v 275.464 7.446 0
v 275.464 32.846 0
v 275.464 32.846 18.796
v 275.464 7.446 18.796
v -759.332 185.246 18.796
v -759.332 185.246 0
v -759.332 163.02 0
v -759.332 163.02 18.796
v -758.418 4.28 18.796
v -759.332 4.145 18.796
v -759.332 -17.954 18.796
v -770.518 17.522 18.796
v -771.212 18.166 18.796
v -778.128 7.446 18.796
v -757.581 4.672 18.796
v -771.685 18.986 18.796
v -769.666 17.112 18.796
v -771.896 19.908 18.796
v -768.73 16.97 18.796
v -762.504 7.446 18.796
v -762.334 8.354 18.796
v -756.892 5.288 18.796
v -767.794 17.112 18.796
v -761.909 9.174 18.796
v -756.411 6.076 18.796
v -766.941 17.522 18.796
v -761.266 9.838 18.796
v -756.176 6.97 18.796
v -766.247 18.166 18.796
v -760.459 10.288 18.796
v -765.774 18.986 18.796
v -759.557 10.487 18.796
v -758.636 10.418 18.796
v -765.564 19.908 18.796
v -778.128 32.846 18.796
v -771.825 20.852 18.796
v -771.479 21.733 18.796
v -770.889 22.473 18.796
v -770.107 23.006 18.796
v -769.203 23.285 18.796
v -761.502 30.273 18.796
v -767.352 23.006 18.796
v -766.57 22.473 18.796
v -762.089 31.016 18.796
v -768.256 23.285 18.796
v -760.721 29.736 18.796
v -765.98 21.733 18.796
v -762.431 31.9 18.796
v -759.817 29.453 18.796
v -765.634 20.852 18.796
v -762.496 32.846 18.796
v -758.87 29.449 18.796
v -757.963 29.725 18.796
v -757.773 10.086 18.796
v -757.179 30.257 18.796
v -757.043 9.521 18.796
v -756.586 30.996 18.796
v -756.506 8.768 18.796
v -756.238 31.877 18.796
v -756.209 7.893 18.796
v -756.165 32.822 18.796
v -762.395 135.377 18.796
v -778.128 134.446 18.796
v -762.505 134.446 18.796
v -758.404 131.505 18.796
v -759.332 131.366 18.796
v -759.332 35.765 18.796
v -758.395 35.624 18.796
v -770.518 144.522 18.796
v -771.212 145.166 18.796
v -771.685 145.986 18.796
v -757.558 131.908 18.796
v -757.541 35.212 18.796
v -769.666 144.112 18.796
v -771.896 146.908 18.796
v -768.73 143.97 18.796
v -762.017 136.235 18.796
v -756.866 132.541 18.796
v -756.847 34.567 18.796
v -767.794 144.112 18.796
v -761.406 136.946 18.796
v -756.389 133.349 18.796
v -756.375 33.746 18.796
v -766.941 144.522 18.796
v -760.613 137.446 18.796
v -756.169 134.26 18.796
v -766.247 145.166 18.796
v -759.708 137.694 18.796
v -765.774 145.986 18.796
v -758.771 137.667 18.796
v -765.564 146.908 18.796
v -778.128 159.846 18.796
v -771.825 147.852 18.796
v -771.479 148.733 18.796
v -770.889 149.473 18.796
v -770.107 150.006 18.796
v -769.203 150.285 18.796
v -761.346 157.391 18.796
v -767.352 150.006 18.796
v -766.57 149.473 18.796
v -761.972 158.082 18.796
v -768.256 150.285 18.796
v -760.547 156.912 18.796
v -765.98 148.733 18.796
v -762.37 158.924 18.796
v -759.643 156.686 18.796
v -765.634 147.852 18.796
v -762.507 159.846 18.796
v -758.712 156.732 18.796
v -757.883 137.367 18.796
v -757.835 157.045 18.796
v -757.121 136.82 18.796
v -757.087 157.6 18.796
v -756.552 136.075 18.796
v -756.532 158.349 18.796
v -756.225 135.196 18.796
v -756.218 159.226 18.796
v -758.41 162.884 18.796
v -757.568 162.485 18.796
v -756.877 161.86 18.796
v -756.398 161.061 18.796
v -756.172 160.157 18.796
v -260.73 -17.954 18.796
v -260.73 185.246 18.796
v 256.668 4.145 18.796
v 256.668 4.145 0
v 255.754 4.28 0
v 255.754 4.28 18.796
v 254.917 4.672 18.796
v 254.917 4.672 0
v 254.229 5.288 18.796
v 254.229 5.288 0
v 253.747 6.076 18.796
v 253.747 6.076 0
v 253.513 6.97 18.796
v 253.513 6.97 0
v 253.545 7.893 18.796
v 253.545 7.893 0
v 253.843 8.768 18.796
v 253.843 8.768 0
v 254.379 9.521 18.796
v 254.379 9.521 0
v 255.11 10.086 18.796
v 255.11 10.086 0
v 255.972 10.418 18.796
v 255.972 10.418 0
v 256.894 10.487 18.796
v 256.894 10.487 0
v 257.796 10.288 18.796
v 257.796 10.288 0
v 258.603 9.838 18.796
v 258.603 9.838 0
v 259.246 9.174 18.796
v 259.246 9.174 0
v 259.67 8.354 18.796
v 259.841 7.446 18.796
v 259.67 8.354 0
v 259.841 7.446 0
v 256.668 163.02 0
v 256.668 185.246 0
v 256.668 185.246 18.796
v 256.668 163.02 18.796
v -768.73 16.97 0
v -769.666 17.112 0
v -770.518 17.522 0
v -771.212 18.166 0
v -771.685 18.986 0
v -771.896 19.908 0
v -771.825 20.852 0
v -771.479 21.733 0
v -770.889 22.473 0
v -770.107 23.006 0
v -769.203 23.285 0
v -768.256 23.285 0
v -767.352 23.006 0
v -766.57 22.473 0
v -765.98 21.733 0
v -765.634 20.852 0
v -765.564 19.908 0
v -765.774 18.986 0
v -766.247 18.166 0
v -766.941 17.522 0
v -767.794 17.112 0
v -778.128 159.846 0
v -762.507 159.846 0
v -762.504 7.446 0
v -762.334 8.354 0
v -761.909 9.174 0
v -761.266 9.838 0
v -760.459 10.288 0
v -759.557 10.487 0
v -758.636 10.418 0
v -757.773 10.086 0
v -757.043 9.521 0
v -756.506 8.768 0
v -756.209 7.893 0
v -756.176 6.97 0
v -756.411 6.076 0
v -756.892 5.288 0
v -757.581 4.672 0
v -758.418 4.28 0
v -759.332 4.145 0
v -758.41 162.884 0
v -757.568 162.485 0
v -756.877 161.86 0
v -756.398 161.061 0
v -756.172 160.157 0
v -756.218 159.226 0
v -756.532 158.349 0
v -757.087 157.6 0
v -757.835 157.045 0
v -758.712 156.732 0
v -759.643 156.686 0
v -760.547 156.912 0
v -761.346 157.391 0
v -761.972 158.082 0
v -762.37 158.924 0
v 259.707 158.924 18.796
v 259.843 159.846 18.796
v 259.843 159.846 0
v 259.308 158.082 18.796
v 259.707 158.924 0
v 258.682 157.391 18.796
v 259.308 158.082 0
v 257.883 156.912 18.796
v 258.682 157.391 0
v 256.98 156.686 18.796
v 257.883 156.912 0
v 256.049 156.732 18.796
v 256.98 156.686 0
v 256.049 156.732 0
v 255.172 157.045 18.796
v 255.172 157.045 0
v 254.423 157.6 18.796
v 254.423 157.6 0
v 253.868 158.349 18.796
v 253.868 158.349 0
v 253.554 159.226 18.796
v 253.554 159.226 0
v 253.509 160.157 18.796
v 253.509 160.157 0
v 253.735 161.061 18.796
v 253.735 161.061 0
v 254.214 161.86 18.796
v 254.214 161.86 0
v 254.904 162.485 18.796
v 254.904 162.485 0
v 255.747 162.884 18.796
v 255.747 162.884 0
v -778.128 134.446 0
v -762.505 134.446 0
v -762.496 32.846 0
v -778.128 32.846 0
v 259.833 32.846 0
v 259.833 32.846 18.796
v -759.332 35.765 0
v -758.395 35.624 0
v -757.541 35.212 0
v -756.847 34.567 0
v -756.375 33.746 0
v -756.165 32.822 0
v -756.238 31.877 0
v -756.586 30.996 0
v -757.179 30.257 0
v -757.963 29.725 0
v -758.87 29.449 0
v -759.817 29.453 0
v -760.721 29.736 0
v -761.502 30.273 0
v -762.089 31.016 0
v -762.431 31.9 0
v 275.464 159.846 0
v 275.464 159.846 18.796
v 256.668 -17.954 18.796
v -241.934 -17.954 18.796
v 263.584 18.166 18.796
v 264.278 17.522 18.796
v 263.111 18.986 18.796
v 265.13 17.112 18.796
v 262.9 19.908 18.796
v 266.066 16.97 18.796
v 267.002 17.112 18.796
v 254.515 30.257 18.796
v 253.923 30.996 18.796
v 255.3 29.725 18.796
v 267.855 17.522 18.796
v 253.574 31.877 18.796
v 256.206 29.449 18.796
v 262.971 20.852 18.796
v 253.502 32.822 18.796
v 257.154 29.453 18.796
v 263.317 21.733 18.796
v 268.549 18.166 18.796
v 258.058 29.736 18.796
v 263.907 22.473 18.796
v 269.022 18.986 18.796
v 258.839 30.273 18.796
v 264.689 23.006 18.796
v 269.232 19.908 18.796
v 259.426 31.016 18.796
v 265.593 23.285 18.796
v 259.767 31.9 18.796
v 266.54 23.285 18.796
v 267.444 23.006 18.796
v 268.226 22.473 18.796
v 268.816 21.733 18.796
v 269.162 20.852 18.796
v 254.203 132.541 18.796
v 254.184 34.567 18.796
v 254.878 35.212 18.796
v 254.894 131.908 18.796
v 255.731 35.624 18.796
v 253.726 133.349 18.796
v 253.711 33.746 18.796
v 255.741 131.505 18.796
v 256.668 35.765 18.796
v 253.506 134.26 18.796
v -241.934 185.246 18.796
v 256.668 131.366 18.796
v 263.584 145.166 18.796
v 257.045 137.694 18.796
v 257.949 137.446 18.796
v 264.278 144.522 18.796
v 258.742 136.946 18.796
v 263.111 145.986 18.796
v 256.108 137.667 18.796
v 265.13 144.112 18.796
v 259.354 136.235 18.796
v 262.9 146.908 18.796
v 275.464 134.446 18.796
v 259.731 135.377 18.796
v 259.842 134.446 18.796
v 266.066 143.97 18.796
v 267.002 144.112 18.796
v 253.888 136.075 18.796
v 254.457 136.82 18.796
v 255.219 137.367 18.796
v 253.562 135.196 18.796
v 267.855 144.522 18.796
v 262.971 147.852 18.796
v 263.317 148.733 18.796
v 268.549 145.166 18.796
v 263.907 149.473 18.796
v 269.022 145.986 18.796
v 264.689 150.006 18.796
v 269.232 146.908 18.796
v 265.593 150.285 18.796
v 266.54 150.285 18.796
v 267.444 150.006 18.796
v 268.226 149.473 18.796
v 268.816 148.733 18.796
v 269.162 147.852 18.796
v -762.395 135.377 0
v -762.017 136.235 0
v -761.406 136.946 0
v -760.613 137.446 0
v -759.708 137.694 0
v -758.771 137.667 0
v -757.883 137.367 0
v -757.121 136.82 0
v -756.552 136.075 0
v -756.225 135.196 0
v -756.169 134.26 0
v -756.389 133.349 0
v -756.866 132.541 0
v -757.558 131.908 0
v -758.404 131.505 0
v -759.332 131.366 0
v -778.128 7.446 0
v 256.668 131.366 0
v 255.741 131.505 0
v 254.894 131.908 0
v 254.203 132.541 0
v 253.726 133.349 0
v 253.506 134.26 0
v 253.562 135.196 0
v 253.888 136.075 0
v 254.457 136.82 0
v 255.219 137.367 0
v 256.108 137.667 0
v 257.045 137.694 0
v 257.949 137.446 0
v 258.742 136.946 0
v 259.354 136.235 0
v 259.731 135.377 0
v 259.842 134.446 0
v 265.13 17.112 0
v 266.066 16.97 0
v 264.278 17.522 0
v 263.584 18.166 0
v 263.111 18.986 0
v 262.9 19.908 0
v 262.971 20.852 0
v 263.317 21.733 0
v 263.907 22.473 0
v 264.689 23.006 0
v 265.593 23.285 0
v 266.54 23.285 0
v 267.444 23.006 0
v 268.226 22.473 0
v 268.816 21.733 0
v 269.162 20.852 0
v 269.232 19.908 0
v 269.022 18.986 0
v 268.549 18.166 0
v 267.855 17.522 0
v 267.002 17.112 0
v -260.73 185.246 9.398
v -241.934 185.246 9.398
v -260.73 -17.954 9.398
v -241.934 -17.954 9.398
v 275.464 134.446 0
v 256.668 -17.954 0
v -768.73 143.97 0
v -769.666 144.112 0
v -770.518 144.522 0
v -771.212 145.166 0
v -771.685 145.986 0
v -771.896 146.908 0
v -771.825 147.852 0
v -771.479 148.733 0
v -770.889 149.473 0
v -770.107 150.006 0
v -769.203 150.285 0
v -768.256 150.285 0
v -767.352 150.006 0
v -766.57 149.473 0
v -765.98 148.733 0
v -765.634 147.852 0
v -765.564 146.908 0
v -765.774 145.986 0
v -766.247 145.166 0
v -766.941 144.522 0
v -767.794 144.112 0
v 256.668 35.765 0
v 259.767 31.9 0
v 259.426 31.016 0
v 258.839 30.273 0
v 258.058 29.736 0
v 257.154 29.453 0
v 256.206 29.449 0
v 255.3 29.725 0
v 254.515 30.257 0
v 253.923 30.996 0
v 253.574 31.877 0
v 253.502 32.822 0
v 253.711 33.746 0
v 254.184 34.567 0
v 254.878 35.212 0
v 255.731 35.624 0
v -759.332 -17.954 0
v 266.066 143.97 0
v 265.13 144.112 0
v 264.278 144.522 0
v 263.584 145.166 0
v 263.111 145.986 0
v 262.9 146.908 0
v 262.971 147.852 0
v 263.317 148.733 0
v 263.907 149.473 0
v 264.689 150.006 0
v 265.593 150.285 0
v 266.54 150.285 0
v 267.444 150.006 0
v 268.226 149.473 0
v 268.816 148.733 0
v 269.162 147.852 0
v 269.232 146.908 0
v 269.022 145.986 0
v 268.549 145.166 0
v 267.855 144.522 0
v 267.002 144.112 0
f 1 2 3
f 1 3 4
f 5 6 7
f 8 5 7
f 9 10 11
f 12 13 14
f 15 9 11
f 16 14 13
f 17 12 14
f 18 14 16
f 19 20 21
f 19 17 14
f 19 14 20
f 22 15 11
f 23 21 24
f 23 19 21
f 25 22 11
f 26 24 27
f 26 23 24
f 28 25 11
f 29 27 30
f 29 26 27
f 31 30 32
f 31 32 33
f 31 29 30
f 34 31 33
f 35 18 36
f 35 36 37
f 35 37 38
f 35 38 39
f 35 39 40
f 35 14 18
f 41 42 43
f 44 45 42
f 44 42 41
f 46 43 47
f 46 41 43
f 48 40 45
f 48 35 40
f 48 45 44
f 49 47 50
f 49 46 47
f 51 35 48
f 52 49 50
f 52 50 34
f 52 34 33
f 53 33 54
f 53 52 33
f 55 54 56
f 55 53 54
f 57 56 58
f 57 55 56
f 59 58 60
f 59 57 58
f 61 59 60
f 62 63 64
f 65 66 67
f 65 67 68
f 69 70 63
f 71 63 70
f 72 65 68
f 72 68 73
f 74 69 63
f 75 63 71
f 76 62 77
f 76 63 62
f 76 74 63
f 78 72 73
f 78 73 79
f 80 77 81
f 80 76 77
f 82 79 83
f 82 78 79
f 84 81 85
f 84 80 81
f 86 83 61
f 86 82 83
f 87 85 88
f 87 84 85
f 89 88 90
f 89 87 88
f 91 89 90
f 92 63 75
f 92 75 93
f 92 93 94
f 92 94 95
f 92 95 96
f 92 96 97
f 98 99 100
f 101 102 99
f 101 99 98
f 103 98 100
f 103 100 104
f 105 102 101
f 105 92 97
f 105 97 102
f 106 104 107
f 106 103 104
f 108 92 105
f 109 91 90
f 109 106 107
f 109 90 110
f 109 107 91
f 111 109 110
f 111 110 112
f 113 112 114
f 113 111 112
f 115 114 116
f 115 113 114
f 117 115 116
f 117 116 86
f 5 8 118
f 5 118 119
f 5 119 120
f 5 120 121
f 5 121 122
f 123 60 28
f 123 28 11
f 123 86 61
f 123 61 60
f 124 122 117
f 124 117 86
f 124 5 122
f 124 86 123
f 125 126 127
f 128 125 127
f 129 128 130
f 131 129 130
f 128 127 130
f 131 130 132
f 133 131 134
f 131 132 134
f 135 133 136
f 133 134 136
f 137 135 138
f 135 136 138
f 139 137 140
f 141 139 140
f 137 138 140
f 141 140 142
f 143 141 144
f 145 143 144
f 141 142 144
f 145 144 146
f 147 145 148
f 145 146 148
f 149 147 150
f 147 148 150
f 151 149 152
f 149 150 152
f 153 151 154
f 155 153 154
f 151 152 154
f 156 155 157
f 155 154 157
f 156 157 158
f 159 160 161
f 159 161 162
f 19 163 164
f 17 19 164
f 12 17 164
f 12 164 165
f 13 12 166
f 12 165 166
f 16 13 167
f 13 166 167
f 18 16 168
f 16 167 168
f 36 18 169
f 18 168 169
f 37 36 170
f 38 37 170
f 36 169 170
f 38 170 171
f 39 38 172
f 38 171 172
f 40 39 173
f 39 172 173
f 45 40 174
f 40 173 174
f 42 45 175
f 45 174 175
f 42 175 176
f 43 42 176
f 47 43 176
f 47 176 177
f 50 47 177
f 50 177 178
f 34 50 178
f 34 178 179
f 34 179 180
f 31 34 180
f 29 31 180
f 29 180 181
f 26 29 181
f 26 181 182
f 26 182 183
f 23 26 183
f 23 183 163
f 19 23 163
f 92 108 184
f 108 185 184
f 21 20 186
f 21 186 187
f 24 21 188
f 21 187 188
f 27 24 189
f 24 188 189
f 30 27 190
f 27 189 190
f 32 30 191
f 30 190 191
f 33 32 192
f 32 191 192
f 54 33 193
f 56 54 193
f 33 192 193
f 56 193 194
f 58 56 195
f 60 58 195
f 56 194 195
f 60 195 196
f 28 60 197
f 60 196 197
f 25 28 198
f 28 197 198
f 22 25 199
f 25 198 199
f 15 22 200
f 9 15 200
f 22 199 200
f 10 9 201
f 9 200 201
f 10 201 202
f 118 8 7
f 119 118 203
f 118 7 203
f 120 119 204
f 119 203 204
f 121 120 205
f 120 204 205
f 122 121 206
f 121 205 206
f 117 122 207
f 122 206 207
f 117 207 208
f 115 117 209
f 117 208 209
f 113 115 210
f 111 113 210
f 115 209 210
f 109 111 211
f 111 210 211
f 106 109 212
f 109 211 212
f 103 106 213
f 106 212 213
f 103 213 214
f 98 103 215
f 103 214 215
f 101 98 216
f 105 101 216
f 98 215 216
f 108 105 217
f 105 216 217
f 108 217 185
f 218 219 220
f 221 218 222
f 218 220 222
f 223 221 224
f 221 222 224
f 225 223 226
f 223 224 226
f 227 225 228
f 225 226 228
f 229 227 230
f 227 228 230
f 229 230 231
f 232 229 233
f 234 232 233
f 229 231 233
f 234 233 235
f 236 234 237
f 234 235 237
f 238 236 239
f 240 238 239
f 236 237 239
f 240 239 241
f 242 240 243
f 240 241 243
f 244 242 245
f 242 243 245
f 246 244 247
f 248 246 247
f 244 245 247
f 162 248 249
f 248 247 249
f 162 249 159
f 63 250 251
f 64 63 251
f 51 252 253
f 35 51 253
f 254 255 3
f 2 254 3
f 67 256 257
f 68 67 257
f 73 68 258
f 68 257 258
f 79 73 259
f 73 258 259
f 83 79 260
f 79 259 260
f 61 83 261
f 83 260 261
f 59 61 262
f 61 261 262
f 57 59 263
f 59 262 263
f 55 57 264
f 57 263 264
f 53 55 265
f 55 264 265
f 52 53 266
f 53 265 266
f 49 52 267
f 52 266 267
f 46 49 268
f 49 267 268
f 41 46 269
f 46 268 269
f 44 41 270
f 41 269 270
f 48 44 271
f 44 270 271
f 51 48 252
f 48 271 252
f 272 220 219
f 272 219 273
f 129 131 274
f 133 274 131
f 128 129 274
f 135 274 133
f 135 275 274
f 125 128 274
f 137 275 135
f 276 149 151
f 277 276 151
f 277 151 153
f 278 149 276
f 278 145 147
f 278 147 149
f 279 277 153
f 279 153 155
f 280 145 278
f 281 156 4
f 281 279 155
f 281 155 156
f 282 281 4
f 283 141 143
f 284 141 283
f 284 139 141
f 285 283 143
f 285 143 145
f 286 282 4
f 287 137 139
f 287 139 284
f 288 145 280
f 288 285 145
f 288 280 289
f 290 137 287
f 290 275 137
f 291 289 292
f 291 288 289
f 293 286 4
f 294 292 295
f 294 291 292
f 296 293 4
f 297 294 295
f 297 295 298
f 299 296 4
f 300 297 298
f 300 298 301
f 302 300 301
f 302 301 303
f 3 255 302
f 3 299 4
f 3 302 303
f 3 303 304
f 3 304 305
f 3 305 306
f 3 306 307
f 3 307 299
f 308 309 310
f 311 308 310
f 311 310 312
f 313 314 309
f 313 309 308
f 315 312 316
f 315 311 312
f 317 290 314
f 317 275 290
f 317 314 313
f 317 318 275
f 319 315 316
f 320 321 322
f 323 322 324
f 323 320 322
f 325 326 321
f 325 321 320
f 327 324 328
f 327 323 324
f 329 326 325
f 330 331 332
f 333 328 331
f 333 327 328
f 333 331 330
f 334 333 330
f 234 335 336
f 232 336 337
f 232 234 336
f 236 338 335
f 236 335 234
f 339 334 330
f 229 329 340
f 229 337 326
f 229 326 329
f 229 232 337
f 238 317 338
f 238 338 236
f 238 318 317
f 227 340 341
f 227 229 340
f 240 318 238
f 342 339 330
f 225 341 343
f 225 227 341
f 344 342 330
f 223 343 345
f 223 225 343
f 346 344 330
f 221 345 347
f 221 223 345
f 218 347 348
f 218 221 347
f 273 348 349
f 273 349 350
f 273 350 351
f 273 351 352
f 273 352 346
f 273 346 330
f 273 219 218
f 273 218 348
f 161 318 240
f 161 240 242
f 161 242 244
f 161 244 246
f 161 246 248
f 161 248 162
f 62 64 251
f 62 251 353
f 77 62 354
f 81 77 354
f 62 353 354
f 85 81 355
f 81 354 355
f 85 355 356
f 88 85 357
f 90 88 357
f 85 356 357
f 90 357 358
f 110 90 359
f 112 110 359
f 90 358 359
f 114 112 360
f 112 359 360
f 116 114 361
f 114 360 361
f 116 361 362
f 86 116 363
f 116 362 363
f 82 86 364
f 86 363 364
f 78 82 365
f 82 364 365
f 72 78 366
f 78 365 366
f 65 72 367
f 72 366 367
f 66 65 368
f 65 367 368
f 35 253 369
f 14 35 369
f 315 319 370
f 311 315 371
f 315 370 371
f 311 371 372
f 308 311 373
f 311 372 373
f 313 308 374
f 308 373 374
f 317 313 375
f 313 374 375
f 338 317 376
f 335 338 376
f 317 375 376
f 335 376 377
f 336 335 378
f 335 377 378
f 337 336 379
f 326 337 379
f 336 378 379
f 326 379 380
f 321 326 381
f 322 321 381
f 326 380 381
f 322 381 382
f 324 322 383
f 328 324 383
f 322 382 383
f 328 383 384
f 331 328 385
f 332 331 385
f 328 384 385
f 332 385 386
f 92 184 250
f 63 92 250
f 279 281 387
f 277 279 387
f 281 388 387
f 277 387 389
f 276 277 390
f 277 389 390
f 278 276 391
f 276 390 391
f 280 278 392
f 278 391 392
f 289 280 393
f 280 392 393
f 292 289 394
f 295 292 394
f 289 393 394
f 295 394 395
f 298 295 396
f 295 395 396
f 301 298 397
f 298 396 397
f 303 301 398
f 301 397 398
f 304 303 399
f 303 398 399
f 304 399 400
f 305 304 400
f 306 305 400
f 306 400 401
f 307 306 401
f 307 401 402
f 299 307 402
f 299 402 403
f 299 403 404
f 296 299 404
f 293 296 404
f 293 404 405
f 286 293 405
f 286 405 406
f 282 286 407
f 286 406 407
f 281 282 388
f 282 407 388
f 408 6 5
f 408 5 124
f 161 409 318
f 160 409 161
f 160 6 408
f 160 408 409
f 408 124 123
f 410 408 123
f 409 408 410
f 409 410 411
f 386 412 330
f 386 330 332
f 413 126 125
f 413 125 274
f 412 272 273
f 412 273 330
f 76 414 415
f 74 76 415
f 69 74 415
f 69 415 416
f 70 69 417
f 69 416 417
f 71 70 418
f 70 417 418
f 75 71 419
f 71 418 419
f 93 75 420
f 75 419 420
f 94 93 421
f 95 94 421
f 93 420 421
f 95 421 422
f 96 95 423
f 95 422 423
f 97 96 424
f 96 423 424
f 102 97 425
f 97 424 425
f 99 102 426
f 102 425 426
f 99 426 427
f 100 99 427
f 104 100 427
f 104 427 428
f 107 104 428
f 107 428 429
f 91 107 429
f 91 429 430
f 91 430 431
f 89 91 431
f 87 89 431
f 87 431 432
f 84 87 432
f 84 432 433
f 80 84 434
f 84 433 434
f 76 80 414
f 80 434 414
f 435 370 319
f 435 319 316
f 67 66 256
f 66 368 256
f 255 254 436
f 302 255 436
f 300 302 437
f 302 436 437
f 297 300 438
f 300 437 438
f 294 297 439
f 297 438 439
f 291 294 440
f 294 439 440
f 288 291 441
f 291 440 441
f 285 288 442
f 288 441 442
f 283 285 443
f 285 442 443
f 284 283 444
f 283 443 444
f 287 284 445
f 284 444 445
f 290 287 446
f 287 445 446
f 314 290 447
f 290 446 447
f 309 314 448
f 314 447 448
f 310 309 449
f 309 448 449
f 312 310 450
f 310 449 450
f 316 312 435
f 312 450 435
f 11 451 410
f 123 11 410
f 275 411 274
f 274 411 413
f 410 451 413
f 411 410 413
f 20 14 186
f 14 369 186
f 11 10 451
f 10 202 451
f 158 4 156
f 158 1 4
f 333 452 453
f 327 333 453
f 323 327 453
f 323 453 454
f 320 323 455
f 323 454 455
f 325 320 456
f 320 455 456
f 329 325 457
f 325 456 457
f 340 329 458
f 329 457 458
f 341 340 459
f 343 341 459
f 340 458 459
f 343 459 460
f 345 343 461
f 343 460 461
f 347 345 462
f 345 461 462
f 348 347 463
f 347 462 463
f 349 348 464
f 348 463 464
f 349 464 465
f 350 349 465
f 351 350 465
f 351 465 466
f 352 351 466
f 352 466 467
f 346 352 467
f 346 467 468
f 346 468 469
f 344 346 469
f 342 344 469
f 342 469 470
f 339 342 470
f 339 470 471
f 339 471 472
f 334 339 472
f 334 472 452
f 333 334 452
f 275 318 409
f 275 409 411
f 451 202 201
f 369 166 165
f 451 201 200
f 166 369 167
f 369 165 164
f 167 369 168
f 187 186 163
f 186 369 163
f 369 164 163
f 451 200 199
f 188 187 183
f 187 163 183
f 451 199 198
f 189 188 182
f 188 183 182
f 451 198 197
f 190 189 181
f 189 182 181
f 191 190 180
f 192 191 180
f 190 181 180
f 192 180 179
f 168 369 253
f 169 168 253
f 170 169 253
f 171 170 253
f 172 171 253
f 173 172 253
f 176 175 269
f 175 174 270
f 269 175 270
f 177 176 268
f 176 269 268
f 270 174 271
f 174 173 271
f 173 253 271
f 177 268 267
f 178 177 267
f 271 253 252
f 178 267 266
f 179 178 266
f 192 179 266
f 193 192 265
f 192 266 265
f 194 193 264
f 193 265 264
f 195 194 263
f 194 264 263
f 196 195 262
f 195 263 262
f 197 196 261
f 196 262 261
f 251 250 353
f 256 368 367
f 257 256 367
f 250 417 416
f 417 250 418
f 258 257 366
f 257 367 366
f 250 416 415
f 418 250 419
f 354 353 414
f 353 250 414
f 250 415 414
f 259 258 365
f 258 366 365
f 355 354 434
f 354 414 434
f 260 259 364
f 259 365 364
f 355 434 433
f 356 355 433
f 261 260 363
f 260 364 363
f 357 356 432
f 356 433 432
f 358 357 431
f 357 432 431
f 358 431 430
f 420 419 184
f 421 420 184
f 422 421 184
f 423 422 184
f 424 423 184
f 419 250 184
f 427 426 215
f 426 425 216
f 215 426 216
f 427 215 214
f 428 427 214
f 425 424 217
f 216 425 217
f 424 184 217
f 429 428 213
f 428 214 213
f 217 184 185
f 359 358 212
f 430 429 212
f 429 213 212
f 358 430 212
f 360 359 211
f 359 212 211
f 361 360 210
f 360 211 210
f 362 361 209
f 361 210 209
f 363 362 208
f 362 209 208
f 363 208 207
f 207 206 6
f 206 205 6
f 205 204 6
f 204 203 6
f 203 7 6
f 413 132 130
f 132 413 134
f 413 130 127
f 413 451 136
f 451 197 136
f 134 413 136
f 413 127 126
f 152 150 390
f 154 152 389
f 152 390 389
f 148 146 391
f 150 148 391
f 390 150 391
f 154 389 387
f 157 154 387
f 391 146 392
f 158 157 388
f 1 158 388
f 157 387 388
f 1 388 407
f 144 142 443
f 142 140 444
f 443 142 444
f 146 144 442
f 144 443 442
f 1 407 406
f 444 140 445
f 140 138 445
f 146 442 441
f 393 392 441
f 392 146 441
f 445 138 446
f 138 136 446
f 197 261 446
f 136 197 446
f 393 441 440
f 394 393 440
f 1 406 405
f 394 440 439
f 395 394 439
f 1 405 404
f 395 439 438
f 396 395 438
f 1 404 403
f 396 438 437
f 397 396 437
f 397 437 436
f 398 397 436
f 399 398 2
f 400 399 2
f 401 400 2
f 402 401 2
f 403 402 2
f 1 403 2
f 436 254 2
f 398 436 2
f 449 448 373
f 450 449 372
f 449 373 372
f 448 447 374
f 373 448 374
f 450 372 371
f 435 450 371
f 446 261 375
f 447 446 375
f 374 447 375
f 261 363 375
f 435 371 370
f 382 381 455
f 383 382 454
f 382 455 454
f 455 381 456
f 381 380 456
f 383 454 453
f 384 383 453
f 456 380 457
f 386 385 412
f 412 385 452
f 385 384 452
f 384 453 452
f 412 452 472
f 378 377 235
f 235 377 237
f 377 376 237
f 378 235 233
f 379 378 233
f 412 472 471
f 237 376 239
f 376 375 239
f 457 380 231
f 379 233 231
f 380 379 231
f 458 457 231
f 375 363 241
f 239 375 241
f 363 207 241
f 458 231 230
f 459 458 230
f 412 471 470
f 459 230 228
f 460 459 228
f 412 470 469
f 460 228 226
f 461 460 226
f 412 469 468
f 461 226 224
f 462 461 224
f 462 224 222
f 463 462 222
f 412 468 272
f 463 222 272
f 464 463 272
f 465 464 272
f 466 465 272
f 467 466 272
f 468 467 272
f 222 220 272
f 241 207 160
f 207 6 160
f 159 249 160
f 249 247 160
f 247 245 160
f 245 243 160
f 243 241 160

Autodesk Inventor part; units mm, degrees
ref_plane "YZ Plane" through (0, 0, 0) normal (1, 0, 0) x (0, 1, 0)
ref_plane "XZ Plane" through (0, 0, 0) normal (0, 1, 0) x (-1, 0, 0)
ref_plane "XY Plane" through (0, 0, 0) normal (0, 0, 1) x (1, 0, 0)
sketch "Sketch1" plane through (0, 0, 0) normal (0, 0, 1) x (1, 0, 0)
  line L0 (-759.3317, 185.2455) -> (256.6683, 185.2455)
  line L1 (-759.3317, -17.9545) -> (256.6683, -17.9545)
  line L2 (-759.3317, 185.2455) -> (-759.3317, 159.8455)
  line L3 (-759.3317, 159.8455) -> (-778.1277, 159.8455)
  line L4 (-778.1277, 159.8455) -> (-778.1277, 134.4455)
  line L5 (-778.1277, 134.4455) -> (-759.3317, 134.4455)
  line L6 (-759.3317, 134.4455) -> (-759.3317, 32.8455)
  line L7 (-759.3317, 32.8455) -> (-778.1277, 32.8455)
  line L8 (-778.1277, 32.8455) -> (-778.1277, 7.4455)
  line L9 (-778.1277, 7.4455) -> (-759.3317, 7.4455)
  line L10 (-759.3317, 7.4455) -> (-759.3317, -17.9545)
  line L11 (256.6683, 185.2455) -> (256.6683, 159.8455)
  line L12 (256.6683, 159.8455) -> (275.4643, 159.8455)
  line L13 (275.4643, 159.8455) -> (275.4643, 134.4455)
  line L14 (275.4643, 134.4455) -> (256.6683, 134.4455)
  line L15 (256.6683, 134.4455) -> (256.6683, 32.8455)
  line L16 (256.6683, 32.8455) -> (275.4643, 32.8455)
  line L17 (275.4643, 32.8455) -> (275.4643, 7.4455)
  line L18 (275.4643, 7.4455) -> (256.6683, 7.4455)
  line L19 (256.6683, 7.4455) -> (256.6683, -17.9545)
  point P0 (0, 0)
  dimension "d0" = 1016
  dimension "d1" = 203.2
  dimension "d2" = 25.4
  dimension "d3" = 25.4
  dimension "d4" = 25.4
  dimension "d5" = 25.4
  dimension "d6" = 18.796
  dimension "d7" = 18.796
  dimension "d8" = 18.796
  dimension "d9" = 25.4
  dimension "d11" = 25.4
  dimension "d12" = 25.4
  dimension "d15" = 25.4
extrude "Extrusion1" add sketch "Sketch1" along normal blind 18.796
sketch "Sketch2" plane through (0, 0, 18.796) normal (0, 0, 1) x (1, 0, 0)
  line L0 (-778.1277, 159.8455) -> (-759.3317, 159.8455) projected
  line L1 (275.4643, 159.8455) -> (256.6683, 159.8455) projected
  point P0 (0, 0)
  point P1 (-759.3317, 134.5414)
  point P2 (-759.3317, 32.5902)
  point P3 (-759.3317, 7.3202)
  point P4 (256.6683, 134.5414)
  point P5 (256.6683, 32.5902)
  point P6 (256.6683, 7.3202)
hole "Hole1" at (-759.3317, 159.8455, 18.796) at (-759.3317, 134.5414, 18.796) at (-759.3317, 32.5902, 18.796) at (-759.3317, 7.3202, 18.796) at (256.6683, 159.8455, 18.796) at (256.6683, 134.5414, 18.796) at (256.6683, 32.5902, 18.796) at (256.6683, 7.3202, 18.796) direction (0, 0, -1) diameter 6.35 end through all
sketch "Sketch3" plane through (0, 0, 18.796) normal (0, 0, 1) x (1, 0, 0)
  line L0 (-778.1277, 159.8455) -> (-778.1277, 134.4455) projected
  line L1 (-778.1277, 32.8455) -> (-778.1277, 7.4455) projected
  line L2 (-762.4964, 32.8455) -> (-778.1277, 32.8455) projected
  line L3 (-778.1277, 134.4455) -> (-762.5052, 134.4455) projected
  line L4 (275.4643, 159.8455) -> (275.4643, 134.4455) projected
  line L5 (275.4643, 159.8455) -> (259.8433, 159.8455) projected
  line L6 (275.4643, 32.8455) -> (259.833, 32.8455) projected
  line L7 (275.4643, 32.8455) -> (275.4643, 7.4455) projected
  point P0 (0, 0)
  point P1 (266.0663, 147.1455)
  point P2 (266.0663, 20.1455)
  point P3 (-768.7297, 20.1455)
  point P4 (-768.7297, 147.1455)
  dimension "d25" = 9.398
  dimension "d26" = 9.398
  dimension "d27" = 12.7
  dimension "d28" = 12.7
  dimension "d29" = 9.398
  dimension "d30" = 12.7
  dimension "d31" = 12.7
  dimension "d32" = 9.398
hole "Hole2" at (266.0663, 147.1455, 18.796) at (266.0663, 20.1455, 18.796) at (-768.7297, 20.1455, 18.796) at (-768.7297, 147.1455, 18.796) direction (0, 0, -1) diameter 6.35 end through all
sketch "Sketch4" plane through (0, 0, 18.796) normal (0, 0, 1) x (1, 0, 0)
  line L0 (-759.3317, 185.2455) -> (256.6683, 185.2455) projected
  line L1 (-251.3317, 185.2455) -> (-251.3317, -17.9545)
  line L2 (256.6683, -17.9545) -> (-759.3317, -17.9545) projected
  line L3 (-260.7297, 185.2455) -> (-260.7297, -17.9545)
  line L4 (-241.9337, 185.2455) -> (-241.9337, -17.9545)
  line L5 (-260.7297, 185.2455) -> (-241.9337, 185.2455)
  line L6 (-260.7297, -17.9545) -> (-241.9337, -17.9545)
  point P0 (0, 0)
  dimension "d40" = 9.398
  dimension "d41" = 9.398
extrude "Extrusion2" cut sketch "Sketch4" against normal blind 9.398
properties part number "shelf" material "Wood (Birch)"
